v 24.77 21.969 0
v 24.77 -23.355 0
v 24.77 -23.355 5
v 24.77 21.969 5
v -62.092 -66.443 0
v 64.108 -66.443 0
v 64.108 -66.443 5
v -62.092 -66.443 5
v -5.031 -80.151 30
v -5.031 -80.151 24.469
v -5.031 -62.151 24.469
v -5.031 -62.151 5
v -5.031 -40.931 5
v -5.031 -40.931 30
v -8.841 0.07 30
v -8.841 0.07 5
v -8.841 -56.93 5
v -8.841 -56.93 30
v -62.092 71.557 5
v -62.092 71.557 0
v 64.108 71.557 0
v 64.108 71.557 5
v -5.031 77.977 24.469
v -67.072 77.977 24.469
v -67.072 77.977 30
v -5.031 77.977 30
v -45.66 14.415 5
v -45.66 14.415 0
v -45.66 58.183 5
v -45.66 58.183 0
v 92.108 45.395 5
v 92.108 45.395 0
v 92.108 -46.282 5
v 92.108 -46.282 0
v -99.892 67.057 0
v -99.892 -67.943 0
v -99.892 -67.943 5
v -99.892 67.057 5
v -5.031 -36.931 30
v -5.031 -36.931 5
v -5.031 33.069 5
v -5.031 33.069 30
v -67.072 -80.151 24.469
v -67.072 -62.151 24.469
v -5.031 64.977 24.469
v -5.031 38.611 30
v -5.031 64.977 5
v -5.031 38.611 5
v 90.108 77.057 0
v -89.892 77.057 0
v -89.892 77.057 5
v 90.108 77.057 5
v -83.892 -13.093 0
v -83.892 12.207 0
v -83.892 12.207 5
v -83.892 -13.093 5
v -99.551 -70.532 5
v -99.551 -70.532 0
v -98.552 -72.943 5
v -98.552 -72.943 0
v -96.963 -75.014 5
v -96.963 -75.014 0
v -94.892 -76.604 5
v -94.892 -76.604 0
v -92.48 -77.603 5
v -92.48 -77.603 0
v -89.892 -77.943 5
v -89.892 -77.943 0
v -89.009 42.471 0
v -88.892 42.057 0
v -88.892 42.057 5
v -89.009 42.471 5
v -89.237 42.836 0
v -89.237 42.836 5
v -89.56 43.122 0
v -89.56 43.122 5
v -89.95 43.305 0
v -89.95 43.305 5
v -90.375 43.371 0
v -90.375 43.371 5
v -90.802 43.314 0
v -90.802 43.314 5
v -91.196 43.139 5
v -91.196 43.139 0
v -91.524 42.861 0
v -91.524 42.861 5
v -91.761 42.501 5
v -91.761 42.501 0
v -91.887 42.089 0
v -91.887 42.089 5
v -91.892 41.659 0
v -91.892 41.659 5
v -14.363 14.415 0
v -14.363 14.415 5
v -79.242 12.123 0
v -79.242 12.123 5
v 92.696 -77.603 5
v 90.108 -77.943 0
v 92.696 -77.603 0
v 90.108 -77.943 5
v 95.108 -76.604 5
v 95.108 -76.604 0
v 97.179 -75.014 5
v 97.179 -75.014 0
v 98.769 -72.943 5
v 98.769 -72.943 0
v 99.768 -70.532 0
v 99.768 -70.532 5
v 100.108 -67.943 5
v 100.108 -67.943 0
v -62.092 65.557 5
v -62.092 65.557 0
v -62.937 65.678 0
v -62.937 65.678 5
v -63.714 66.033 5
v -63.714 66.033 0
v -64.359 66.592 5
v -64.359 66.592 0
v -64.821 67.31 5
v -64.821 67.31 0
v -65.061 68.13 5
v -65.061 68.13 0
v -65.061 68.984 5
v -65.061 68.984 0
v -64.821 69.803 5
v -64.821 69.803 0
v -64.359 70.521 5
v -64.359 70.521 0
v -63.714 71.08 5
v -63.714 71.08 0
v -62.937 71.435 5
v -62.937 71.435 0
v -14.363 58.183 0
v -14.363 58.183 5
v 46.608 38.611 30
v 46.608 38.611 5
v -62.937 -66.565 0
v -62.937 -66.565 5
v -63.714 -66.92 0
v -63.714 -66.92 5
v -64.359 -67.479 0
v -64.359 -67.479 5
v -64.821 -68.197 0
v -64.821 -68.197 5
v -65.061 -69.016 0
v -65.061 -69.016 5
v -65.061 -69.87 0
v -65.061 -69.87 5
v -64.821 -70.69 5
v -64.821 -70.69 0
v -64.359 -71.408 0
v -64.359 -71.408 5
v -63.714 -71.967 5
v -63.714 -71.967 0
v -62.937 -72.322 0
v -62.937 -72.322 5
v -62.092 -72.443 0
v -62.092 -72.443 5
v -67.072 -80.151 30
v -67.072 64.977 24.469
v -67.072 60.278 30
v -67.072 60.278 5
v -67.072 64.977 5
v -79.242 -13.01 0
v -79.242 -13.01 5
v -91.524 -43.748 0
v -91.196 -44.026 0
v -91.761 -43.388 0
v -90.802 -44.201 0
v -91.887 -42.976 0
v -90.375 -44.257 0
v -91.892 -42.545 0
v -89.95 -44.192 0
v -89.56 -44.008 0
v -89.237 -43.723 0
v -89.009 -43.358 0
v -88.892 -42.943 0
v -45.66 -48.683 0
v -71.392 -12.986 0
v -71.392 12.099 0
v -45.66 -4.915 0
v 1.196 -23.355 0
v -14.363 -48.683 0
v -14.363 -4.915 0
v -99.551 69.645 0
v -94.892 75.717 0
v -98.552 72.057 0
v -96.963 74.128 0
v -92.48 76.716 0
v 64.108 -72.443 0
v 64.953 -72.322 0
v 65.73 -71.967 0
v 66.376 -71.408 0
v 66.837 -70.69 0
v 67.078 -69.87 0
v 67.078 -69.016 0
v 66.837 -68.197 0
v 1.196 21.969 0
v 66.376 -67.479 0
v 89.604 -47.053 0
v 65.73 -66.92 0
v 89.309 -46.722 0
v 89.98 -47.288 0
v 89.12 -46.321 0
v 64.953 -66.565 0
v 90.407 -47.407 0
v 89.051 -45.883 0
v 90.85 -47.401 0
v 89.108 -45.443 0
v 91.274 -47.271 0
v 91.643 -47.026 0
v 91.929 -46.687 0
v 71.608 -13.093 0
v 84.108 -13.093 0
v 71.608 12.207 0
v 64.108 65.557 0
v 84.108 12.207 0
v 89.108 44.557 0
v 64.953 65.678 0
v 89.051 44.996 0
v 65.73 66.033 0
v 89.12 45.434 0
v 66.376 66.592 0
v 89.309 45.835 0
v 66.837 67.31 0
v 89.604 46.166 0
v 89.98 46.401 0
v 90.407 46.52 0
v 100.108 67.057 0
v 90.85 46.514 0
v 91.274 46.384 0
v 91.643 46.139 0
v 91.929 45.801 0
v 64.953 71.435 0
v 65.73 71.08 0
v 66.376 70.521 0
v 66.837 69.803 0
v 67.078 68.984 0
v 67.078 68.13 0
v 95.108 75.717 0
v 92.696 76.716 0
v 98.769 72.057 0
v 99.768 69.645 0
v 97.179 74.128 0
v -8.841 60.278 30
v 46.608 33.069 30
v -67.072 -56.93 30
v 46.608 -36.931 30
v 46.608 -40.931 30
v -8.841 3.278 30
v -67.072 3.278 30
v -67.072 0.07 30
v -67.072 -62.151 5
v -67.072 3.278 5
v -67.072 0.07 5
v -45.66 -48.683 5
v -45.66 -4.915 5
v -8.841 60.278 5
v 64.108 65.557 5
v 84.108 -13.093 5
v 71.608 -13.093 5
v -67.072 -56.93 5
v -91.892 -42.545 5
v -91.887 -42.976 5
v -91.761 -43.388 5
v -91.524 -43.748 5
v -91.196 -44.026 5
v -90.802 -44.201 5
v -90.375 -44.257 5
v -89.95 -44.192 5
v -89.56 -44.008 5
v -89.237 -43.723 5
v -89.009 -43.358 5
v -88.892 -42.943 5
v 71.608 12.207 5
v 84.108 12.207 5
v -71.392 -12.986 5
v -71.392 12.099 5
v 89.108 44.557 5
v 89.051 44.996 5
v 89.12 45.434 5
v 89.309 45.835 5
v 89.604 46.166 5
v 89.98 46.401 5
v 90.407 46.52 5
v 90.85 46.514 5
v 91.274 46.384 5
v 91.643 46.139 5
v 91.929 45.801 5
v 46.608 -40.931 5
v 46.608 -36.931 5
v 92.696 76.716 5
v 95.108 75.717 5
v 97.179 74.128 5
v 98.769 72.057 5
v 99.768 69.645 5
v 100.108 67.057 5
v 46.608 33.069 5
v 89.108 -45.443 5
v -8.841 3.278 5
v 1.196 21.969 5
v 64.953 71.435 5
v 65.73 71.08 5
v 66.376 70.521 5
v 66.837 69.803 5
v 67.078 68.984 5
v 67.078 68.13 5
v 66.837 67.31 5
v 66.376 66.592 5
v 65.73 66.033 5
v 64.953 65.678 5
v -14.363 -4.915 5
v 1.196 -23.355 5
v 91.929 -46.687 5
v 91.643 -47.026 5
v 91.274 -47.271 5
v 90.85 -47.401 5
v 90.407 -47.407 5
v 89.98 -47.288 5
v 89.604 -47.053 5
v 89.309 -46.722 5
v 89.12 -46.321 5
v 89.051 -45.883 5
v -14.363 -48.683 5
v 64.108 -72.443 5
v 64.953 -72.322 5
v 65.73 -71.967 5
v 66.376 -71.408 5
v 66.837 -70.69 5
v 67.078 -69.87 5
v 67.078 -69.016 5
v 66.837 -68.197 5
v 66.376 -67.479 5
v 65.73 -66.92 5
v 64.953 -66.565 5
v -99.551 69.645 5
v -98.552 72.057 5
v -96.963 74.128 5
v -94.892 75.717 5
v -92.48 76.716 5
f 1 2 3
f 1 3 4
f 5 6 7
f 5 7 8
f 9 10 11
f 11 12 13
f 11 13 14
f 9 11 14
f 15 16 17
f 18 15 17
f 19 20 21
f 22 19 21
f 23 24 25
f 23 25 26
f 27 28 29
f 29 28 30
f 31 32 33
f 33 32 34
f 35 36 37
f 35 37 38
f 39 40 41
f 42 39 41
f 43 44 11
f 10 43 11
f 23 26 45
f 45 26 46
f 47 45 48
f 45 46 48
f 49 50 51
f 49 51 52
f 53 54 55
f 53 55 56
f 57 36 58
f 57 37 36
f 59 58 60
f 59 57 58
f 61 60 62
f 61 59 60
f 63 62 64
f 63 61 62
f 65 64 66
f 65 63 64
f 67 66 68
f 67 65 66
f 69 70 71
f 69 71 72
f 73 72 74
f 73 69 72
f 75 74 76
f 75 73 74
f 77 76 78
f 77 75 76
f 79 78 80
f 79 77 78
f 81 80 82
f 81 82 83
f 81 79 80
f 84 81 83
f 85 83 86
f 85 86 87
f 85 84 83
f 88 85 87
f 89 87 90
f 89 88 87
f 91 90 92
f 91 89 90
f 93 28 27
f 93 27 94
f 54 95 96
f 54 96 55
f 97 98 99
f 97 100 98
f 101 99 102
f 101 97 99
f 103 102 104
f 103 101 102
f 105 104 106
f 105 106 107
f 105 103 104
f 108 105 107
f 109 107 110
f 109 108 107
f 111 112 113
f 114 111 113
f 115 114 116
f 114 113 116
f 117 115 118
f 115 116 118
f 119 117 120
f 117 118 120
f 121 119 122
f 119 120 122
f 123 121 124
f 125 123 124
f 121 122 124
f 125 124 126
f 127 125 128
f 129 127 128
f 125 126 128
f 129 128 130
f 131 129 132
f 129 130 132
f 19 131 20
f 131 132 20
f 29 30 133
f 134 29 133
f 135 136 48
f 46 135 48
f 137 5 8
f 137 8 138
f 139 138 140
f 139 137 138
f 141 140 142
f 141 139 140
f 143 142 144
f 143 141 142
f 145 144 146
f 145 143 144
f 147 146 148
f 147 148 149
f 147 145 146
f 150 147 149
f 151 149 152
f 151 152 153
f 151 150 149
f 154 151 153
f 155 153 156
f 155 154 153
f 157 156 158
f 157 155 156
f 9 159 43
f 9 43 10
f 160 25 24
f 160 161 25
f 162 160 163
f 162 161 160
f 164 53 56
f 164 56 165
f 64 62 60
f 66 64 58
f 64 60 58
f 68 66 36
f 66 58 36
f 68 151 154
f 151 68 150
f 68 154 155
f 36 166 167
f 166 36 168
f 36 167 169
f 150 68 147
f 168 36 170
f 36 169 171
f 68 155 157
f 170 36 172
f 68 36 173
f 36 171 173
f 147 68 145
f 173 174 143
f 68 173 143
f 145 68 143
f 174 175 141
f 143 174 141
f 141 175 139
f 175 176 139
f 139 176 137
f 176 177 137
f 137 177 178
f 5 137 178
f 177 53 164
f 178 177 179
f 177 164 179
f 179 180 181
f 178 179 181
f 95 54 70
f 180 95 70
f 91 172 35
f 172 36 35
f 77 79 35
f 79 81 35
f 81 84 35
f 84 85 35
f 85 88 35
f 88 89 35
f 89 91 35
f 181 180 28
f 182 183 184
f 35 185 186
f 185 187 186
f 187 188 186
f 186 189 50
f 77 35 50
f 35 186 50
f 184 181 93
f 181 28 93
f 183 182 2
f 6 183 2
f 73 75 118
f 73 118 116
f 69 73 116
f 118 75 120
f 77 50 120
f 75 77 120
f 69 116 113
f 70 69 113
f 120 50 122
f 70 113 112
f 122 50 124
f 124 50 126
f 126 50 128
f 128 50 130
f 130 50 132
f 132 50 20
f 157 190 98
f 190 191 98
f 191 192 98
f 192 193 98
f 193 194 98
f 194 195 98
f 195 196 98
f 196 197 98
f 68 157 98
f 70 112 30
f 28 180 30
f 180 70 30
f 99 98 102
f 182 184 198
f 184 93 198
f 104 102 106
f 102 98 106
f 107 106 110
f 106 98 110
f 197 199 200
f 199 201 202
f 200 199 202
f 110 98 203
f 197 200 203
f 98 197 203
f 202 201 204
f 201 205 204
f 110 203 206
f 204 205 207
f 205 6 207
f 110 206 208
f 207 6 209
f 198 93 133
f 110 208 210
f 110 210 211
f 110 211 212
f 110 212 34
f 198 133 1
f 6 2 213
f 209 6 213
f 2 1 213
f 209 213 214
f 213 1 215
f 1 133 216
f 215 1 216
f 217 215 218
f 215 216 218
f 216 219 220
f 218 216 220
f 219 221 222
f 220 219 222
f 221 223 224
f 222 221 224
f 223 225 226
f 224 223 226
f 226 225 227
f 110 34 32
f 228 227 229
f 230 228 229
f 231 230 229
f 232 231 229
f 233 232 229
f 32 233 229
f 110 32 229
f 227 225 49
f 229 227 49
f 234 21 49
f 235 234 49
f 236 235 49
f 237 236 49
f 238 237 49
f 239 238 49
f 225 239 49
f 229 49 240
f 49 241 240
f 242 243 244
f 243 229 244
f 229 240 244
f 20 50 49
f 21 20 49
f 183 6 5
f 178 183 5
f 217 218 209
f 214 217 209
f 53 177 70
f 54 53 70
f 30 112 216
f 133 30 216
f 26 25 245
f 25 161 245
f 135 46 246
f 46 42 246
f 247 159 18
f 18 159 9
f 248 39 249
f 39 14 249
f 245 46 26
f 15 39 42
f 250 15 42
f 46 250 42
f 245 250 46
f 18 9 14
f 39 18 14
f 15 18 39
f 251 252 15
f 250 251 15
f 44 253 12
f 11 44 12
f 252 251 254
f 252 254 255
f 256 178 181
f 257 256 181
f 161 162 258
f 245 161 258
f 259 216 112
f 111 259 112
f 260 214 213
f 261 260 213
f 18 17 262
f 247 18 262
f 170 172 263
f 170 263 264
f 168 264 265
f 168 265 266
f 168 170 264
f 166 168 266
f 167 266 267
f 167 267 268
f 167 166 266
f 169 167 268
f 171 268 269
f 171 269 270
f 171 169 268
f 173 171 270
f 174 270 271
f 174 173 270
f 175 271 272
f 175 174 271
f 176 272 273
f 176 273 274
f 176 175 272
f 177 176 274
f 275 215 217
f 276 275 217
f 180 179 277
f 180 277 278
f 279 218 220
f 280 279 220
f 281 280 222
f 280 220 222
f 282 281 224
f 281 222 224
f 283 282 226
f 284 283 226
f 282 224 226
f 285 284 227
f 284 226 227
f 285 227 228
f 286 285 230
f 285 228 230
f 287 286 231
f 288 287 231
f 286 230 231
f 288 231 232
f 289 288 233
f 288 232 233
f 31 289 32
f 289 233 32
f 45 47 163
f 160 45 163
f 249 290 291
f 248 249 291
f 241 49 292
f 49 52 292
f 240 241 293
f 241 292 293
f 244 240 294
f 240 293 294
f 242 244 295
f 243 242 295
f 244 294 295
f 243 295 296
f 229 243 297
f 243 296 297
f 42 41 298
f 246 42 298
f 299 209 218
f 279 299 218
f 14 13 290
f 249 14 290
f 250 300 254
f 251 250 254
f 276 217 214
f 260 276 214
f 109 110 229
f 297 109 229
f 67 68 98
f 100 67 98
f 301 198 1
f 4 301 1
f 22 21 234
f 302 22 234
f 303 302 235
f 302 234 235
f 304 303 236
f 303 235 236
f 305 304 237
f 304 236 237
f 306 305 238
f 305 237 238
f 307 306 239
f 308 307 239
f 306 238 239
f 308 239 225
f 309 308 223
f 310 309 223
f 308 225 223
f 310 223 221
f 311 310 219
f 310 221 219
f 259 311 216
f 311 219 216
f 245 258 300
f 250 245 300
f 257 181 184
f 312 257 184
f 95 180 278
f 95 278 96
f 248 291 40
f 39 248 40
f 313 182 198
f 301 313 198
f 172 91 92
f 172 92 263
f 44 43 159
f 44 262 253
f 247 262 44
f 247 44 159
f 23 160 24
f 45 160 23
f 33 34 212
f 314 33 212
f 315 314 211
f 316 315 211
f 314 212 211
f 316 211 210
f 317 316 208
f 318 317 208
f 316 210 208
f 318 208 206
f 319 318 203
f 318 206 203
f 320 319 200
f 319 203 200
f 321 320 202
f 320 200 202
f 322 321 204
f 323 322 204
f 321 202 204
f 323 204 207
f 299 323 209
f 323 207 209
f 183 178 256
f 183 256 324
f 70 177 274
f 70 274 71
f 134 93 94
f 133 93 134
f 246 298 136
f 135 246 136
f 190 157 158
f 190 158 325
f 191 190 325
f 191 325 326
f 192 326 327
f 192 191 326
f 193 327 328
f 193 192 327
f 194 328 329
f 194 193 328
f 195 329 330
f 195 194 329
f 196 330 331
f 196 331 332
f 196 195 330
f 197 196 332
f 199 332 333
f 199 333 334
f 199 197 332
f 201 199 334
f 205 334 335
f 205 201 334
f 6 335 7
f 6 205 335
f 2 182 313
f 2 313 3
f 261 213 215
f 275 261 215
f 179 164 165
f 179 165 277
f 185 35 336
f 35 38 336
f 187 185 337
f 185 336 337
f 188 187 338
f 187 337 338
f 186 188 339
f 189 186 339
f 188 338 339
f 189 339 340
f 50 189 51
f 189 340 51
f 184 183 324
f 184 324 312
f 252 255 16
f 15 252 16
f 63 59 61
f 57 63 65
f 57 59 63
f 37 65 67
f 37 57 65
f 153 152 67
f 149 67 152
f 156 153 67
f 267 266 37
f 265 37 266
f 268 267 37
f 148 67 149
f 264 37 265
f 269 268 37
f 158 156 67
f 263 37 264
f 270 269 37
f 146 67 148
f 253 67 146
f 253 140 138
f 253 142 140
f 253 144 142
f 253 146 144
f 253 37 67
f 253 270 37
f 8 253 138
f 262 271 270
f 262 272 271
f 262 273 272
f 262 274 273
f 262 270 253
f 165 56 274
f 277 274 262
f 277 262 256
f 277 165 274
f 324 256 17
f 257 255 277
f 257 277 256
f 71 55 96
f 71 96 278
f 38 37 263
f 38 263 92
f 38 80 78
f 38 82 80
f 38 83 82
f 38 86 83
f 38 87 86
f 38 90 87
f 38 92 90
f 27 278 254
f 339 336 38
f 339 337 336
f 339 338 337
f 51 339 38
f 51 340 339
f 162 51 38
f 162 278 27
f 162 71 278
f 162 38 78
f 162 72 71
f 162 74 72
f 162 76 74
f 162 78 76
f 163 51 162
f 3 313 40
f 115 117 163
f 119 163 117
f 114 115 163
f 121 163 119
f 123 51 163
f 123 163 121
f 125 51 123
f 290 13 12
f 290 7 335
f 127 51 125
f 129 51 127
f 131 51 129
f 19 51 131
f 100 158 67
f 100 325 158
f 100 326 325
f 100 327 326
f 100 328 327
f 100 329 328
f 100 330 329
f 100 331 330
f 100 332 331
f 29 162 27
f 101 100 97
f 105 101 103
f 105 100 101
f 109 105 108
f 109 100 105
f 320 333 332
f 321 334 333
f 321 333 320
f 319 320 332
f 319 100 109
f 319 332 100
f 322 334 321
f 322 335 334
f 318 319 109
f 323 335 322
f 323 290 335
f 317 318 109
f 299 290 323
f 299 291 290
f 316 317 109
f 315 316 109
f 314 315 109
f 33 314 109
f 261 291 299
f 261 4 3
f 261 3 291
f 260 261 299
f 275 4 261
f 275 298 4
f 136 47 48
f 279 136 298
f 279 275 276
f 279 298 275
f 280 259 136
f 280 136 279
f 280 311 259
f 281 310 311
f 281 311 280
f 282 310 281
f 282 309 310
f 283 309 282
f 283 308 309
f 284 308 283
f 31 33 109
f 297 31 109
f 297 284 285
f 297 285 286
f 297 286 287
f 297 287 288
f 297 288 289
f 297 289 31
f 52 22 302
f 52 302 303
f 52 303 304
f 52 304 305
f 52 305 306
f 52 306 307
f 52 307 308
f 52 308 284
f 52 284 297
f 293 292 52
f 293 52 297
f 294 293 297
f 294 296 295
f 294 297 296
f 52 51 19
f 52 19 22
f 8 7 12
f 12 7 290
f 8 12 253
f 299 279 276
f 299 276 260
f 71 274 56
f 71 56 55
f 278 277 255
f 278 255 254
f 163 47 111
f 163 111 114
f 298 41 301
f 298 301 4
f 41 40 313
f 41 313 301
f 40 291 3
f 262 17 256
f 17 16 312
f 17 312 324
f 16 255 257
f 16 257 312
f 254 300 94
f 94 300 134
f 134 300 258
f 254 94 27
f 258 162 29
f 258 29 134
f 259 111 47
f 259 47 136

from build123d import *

# Parameters (mm, degrees)
CROQUIS2_W              = 200
CROQUIS2_H              = 155
CROQUIS2_W_2            = 31.297292299
CROQUIS2_H_2            = 43.768728426
CROQUIS2_H_3            = 43.768728427
CROQUIS2_W_3            = 23.573907934
CROQUIS2_H_4            = 45.323962431
SALIENTE_EXTRUIR1_DEPTH = 5
REDONDEO1_R             = 10
BOSS_EXTRUDE1_DEPTH     = 25
SKETCH3_W               = 62.040442094
SKETCH3_H               = 5.530821024
BOSS_EXTRUDE2_DEPTH     = 18
SKETCH8_W               = 62.040442094
SKETCH8_H               = 5.530821024
BOSS_EXTRUDE6_DEPTH     = 13


with BuildPart() as part:
    # Croquis2 → Saliente-Extruir1 (new body)
    with BuildSketch(Plane.XY):
        with Locations((0.108263467, -0.443414783)):
            Rectangle(CROQUIS2_W, CROQUIS2_H)
        with BuildLine():
            Line((-62.091736533, 71.556585217), (64.108263467, 71.556585217))
            ThreePointArc((64.108263467, 71.556585217), (67.108263467, 68.556585217), (64.108263467, 65.556585217))
            Line((64.108263467, 65.556585217), (-62.091736533, 65.556585217))
            ThreePointArc((-62.091736533, 65.556585217), (-65.091736533, 68.556585217), (-62.091736533, 71.556585217))
        make_face(mode=Mode.SUBTRACT)
        Polygon((-71.391736533, -12.98578064), (-71.391736533, 12.098951074), (-79.241736533, 12.123251884), (-83.891736533, 12.206585217), (-83.891736533, -13.093414783), (-79.241736533, -13.01008145), align=None, mode=Mode.SUBTRACT)
        with BuildLine():
            Line((92.108263467, 45.395048424), (92.108263467, -46.28187799))
            ThreePointArc((92.108263467, -46.28187799), (90.189031864, -47.362646387), (89.108263467, -45.443414783))
            Line((89.108263467, -45.443414783), (89.108263467, 44.556585217))
            ThreePointArc((89.108263467, 44.556585217), (90.189031864, 46.47581682), (92.108263467, 45.395048424))
        make_face(mode=Mode.SUBTRACT)
        Polygon((84.108263467, 12.206585217), (84.108263467, -13.093414783), (79.458263467, -13.093414783), (71.608263467, -13.093414783), (71.608263467, 12.206585217), (79.458263467, 12.206585217), align=None, mode=Mode.SUBTRACT)
        with BuildLine():
            Line((-91.891736533, 41.658521059), (-91.891736533, -42.545350625))
            ThreePointArc((-91.891736533, -42.545350625), (-90.590768612, -44.244382704), (-88.891736533, -42.943414783))
            Line((-88.891736533, -42.943414783), (-88.891736533, 42.056585217))
            ThreePointArc((-88.891736533, 42.056585217), (-90.590768612, 43.357553138), (-91.891736533, 41.658521059))
        make_face(mode=Mode.SUBTRACT)
        with Locations((-30.011405388, 36.299005811)):
            Rectangle(CROQUIS2_W_2, CROQUIS2_H_2, mode=Mode.SUBTRACT)
        with BuildLine():
            Line((-62.091736533, -72.443414783), (64.108263467, -72.443414783))
            ThreePointArc((64.108263467, -72.443414783), (67.108263467, -69.443414783), (64.108263467, -66.443414783))
            Line((64.108263467, -66.443414783), (-62.091736533, -66.443414783))
            ThreePointArc((-62.091736533, -66.443414783), (-65.091736533, -69.443414783), (-62.091736533, -72.443414783))
        make_face(mode=Mode.SUBTRACT)
        with Locations((-30.011405388, -26.799059535)):
            Rectangle(CROQUIS2_W_2, CROQUIS2_H_3, mode=Mode.SUBTRACT)
        with Locations((12.982877294, -0.693345879)):
            Rectangle(CROQUIS2_W_3, CROQUIS2_H_4, mode=Mode.SUBTRACT)
    extrude(amount=SALIENTE_EXTRUIR1_DEPTH)

    # Redondeo1
    redondeo1_edges = [part.edges().sort_by_distance(p)[0] for p in [
        (100.108263467, -77.943414783, 2.5),
        (-99.891736533, -77.943414783, 2.5),
        (-99.891736533, 77.056585217, 2.5),
        (100.108263467, 77.056585217, 2.5),
    ]]
    fillet(redondeo1_edges, radius=REDONDEO1_R)

    # Sketch1 → Boss-Extrude1 (add)
    with BuildSketch(Plane.XY.offset(5)):
        Polygon((-67.071845217, 64.976726992), (-67.071845217, 60.27797041), (-8.841198185, 60.27797041), (-8.841198185, 3.27797041), (-67.071845217, 3.27797041), (-67.071845217, 0.070097884), (-8.841198185, 0.070097884), (-8.841198185, -56.929902116), (-67.071845217, -56.929902116), (-67.071845217, -62.150742763), (-5.031403123, -62.150742763), (-5.031403123, -40.931443482), (46.608263467, -40.931443482), (46.608263467, -36.931443482), (-5.031403123, -36.931443482), (-5.031403123, 33.068556518), (46.608263467, 33.068556518), (46.608263467, 38.611481725), (-5.031403123, 38.611481725), (-5.031403123, 64.976726992), align=None)
    extrude(amount=BOSS_EXTRUDE1_DEPTH)

    # Sketch3 → Boss-Extrude2 (add)
    with BuildSketch(Plane.XZ.offset(62.150742763)):
        with Locations((-36.05162417, 27.234589488)):
            Rectangle(SKETCH3_W, SKETCH3_H)
    extrude(amount=BOSS_EXTRUDE2_DEPTH)

    # Sketch8 → Boss-Extrude6 (add)
    with BuildSketch(Plane(origin=(0, 64.976726992, 0), x_dir=(1, 0, 0), z_dir=(0, 1, 0))):
        with Locations((-36.05162417, -27.234589488)):
            Rectangle(SKETCH8_W, SKETCH8_H)
    extrude(amount=BOSS_EXTRUDE6_DEPTH)


solid = part.part
